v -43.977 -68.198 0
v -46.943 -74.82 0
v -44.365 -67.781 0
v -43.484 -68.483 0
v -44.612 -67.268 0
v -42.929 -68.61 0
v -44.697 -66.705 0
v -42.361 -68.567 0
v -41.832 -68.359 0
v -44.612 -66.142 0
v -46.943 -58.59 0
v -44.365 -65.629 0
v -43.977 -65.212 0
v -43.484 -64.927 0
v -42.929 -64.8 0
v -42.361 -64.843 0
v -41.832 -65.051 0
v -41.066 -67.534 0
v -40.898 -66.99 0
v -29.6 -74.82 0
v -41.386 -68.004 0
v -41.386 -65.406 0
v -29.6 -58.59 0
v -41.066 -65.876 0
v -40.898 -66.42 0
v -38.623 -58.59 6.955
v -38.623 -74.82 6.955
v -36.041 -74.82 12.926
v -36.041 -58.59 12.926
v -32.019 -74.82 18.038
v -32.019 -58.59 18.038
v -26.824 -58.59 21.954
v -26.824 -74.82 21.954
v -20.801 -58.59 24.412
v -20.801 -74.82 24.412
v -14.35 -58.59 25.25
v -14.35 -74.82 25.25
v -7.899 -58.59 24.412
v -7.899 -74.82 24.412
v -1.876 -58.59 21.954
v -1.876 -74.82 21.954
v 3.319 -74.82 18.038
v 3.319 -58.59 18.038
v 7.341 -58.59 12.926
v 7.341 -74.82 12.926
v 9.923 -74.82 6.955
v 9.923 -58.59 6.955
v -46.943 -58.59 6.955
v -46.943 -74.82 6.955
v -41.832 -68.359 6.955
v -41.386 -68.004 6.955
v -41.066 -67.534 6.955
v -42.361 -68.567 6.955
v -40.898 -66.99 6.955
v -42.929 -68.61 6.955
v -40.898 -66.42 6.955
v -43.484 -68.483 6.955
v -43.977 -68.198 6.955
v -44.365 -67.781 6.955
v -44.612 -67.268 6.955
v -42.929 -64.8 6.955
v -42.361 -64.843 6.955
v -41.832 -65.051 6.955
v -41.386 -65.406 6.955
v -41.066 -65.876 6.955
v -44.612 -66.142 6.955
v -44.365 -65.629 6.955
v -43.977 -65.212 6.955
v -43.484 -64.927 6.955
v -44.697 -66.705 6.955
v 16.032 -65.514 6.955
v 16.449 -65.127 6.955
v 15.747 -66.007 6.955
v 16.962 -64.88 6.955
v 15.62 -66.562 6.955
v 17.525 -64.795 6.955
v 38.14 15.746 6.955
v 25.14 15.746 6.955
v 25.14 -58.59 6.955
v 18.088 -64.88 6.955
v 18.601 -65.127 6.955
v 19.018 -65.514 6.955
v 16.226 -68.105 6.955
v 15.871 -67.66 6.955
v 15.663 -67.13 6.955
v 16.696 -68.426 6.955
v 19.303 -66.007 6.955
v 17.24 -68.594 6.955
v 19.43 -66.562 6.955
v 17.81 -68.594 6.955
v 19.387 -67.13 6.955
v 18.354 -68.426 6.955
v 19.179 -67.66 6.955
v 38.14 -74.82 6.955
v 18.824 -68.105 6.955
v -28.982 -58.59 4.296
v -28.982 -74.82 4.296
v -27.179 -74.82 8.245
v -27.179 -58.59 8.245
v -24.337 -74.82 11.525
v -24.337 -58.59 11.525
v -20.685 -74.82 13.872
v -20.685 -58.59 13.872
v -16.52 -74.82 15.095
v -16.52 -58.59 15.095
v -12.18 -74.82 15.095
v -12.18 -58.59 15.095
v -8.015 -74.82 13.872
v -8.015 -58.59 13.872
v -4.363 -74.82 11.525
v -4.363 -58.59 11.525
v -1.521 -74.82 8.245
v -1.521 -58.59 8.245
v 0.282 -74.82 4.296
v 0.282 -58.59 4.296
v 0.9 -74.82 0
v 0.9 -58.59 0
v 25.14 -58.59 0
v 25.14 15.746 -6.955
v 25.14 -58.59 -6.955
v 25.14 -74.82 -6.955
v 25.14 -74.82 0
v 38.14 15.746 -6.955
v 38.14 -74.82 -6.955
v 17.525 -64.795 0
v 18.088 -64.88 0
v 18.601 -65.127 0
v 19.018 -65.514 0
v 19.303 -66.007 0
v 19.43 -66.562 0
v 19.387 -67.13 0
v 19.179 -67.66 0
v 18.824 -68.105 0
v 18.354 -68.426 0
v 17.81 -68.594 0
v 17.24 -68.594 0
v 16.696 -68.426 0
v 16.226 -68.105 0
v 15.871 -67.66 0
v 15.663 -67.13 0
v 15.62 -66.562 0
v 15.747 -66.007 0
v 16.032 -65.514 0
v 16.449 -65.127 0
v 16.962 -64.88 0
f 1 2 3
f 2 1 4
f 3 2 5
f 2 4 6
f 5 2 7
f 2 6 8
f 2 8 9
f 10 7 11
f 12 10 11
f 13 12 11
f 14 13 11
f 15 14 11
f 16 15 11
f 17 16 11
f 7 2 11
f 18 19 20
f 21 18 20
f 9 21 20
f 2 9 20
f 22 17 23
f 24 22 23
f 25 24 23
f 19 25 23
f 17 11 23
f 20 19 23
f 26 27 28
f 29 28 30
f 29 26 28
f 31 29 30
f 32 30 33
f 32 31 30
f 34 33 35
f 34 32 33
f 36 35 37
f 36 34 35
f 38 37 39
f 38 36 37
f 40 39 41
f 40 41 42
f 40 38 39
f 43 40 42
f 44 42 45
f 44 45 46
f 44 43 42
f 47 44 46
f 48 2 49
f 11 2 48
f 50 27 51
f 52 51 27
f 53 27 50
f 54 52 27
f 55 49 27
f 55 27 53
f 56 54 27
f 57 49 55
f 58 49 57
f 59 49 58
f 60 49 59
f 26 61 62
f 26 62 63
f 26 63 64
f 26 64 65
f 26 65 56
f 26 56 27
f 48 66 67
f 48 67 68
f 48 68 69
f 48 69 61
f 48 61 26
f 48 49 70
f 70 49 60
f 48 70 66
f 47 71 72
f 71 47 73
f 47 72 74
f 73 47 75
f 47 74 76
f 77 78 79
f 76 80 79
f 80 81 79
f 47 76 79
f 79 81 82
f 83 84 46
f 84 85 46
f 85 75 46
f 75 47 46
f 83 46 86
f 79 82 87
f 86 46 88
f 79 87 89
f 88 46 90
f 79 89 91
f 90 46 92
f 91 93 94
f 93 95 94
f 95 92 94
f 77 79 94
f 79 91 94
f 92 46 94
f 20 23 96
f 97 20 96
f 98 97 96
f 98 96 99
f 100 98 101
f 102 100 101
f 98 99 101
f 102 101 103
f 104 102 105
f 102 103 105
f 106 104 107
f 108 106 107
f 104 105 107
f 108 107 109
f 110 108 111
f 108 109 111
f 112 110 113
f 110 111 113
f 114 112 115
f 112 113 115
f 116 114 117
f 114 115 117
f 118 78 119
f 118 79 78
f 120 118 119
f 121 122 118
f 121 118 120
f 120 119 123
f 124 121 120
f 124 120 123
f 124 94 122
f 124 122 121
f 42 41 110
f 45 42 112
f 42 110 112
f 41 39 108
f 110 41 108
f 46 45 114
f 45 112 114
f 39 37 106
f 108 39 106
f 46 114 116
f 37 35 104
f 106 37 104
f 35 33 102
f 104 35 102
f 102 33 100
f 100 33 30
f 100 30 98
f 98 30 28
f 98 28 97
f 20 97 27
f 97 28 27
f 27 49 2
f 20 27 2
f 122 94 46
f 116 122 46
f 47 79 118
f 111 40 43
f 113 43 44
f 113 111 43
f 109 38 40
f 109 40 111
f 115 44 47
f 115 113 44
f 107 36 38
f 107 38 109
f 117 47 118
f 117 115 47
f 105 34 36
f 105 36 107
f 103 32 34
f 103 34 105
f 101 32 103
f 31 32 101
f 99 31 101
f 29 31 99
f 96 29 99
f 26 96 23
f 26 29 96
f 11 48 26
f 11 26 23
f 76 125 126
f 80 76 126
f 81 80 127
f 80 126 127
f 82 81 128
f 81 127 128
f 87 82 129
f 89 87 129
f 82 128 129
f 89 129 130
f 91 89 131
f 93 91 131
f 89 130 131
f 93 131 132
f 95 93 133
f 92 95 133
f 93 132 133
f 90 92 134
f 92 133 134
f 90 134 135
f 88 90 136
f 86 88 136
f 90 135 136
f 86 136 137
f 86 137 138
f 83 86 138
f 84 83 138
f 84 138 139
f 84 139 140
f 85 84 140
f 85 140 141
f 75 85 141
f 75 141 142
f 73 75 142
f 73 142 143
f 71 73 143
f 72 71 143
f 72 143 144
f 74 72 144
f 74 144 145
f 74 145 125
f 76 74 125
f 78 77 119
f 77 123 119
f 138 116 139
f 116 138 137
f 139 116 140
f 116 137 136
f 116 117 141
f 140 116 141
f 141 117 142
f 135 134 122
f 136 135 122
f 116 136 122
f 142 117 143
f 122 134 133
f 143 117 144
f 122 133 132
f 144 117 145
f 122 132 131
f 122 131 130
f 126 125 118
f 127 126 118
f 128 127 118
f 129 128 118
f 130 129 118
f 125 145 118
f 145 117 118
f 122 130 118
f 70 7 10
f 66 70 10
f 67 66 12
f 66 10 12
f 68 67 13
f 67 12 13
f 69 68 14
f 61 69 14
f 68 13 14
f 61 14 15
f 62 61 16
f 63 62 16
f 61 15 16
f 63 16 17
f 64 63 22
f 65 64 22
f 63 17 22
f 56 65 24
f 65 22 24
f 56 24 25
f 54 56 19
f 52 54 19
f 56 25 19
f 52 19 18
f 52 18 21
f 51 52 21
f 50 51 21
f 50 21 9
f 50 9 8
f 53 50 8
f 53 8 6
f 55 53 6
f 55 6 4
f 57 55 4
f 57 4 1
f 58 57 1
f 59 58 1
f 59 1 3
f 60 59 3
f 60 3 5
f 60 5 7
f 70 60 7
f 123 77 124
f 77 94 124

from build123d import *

# Parameters (mm, degrees)
SKETCH_1_W                = 50.28
SKETCH_1_H                = 34.2
SKETCH_1_W_2              = 30.28
SKETCH_1_H_2              = 14.2
EXTRUDE_1_DEPTH           = 12.25
SKETCH_4_W                = 13
SKETCH_4_H                = 13.91
EXTRUDE_1_2_DEPTH         = 74.82
SKETCH_5_W                = 13.91
SKETCH_5_H                = 16.23
EXTRUDE_2_DEPTH           = 16
SKETCH_7_R                = 25.25
SKETCH_7_R_2              = 15.25
EXTRUDE_2_2_DEPTH         = 16.23
SKETCH_15_R               = 1.91
CUT_EXTRUDE_6_DEPTH       = 97.964478439
SKETCH_18_W               = 49.344544624
SKETCH_18_H               = 6.125
CUT_EXTRUDE_8_DEPTH       = 101.789238284
SKETCH_19_W               = 34.2
SKETCH_19_H               = 6.125
CUT_EXTRUDE_9_DEPTH       = 10
SKETCH_21_R               = 1.91
CUT_EXTRUDE_10_DEPTH      = 10
SKETCH_20_R               = 1.91
CUT_EXTRUDE_11_DEPTH      = 10
FILLET_START              = -7.1
FILLET_1_DEPTH            = 14.2
FILLET_2_DEPTH            = 14.2
SKETCH_29_W               = 13.91
SKETCH_29_H               = 74.82
EXTRUDE_5_DEPTH           = 10
SKETCH_30_W               = 10
SKETCH_30_H               = 58.59
CUT_EXTRUDE_13_DEPTH      = 97.964478439
SKETCH_32_W               = 34.2
SKETCH_32_H               = 5.745736365
EXTRUDE_6_DEPTH           = 10
CUT_EXTRUDE_16_DEPTH      = 50
CUT_EXTRUDE_16_DEPTH_BACK = 50
SKETCH_38_W               = 116.985630298
SKETCH_38_H               = 80.538350638
SKETCH_41_W               = 13.91
SKETCH_41_H               = 5.745736365
EXTRUDE_7_DEPTH           = 3
SKETCH_42_W               = 13
SKETCH_42_H               = 13.91
EXTRUDE_8_DEPTH           = 74.82
SKETCH_43_W               = 13.91
SKETCH_43_H               = 16.23
EXTRUDE_9_DEPTH           = 15.22
SKETCH_44_R               = 1.91
CUT_EXTRUDE_17_DEPTH      = 15.22
SKETCH_46_R               = 25.25
SKETCH_46_R_2             = 15.25
EXTRUDE_6_2_DEPTH         = 16.23
EXTRUDE_10_DEPTH          = 7.22
EXTRUDE_10_DEPTH_BACK     = 10
SKETCH_47_W               = 13.91
SKETCH_47_H               = 16.23
SKETCH_50_W               = 3.056753925
SKETCH_50_H               = 16.23
CUT_EXTRUDE_18_DEPTH      = 96.578211037
SKETCH_51_R               = 1.91
CUT_EXTRUDE_19_DEPTH      = 95.015226304
SKETCH_52_W               = 92.841945613
SKETCH_52_H               = 30
CUT_EXTRUDE_20_DEPTH      = 84.840694713
CUT_EXTRUDE_22_DEPTH      = 50
CUT_EXTRUDE_22_DEPTH_BACK = 50
SKETCH_53_W               = 63.541345486
SKETCH_53_H               = 14.170740414
SKETCH_54_W               = 10
SKETCH_54_H               = 10.145
CUT_EXTRUDE_23_DEPTH      = 50
SKETCH_55_W               = 13
SKETCH_55_H               = 13.91
EXTRUDE_11_DEPTH          = 10
SKETCH_57_W               = 15
SKETCH_57_H               = 34.2
EXTRUDE_12_DEPTH          = 10
SKETCH_58_W               = 34.2
SKETCH_58_H               = 10
EXTRUDE_13_DEPTH          = 27.85
SKETCH_60_W               = 34.2
SKETCH_60_H               = 10
EXTRUDE_14_DEPTH          = 50.28
SKETCH_62_W               = 30.28
SKETCH_62_H               = 14.2
CUT_EXTRUDE_24_DEPTH      = 50.28
SKETCH_64_R               = 1.91
CUT_EXTRUDE_25_DEPTH      = 10
FILLET_3_R                = 30
SKETCH_71_W               = 129.242048602
SKETCH_71_H               = 16.62743132
CUT_EXTRUDE_26_DEPTH      = 88


with BuildPart() as part:
    # 草圖1 → Extrude 1 (new body)
    with BuildSketch(Plane(origin=(0, 0, 0), x_dir=(1, 0, 0), z_dir=(0, 1, 0))):
        Rectangle(SKETCH_1_W, SKETCH_1_H)
        Rectangle(SKETCH_1_W_2, SKETCH_1_H_2, mode=Mode.SUBTRACT)
    extrude(amount=EXTRUDE_1_DEPTH)

    # 草圖4 → Extrude 1 2 (add)
    with BuildSketch(Plane.XZ):
        with Locations((18.64, 0)):
            Rectangle(SKETCH_4_W, SKETCH_4_H)
    extrude(amount=EXTRUDE_1_2_DEPTH)

    # 草圖5 → Extrude 2 (add)
    with BuildSketch(Plane.ZY.offset(-12.14)):
        with Locations((0, -66.705)):
            Rectangle(SKETCH_5_W, SKETCH_5_H)
    extrude(amount=EXTRUDE_2_DEPTH)

    # 草圖7 → Extrude 2 2 (add)
    with BuildSketch(Plane(origin=(3.626674765, -74.82, 0), x_dir=(1, 0, 0), z_dir=(0, -1, 0))):
        with Locations((-30.978154344, 0)):
            Circle(SKETCH_7_R)
        with Locations((-30.978154344, 0)):
            Circle(SKETCH_7_R_2, mode=Mode.SUBTRACT)
    extrude(amount=-EXTRUDE_2_2_DEPTH)

    # 草圖15 → 除料-伸長6 (cut, through all)
    with BuildSketch(Plane(origin=(0, 0, -6.955), x_dir=(-1, 0, 0), z_dir=(0, 0, -1))):
        with Locations((-4.530883248, -66.705)):
            Circle(SKETCH_15_R)
    extrude(amount=-CUT_EXTRUDE_6_DEPTH, mode=Mode.SUBTRACT)

    # 草圖18 → 除料-伸長8 (cut, through all)
    with BuildSketch(Plane(origin=(0, 0, -17.1), x_dir=(-1, 0, 0), z_dir=(0, 0, -1))):
        with Locations((0.467727688, 9.1875)):
            Rectangle(SKETCH_18_W, SKETCH_18_H)
    extrude(amount=-CUT_EXTRUDE_8_DEPTH, mode=Mode.SUBTRACT)

    # 草圖19 → 除料-伸長9 (cut)
    with BuildSketch(Plane.ZY.offset(-24.204544624)):
        with Locations((0, 9.1875)):
            Rectangle(SKETCH_19_W, SKETCH_19_H)
    extrude(amount=-CUT_EXTRUDE_9_DEPTH, mode=Mode.SUBTRACT)

    # 草圖21 → 除料-伸長10 (cut)
    with BuildSketch(Plane(origin=(0, 6.125, 0), x_dir=(1, 0, 0), z_dir=(0, 1, 0))):
        with Locations(Location((17.69, 0, 0), (0, 0, 270))):
            Circle(SKETCH_21_R)
    extrude(amount=-CUT_EXTRUDE_10_DEPTH, mode=Mode.SUBTRACT)

    # 草圖20 → 除料-伸長11 (cut)
    with BuildSketch(Plane(origin=(0, 6.125, 0), x_dir=(1, 0, 0), z_dir=(0, 1, 0))):
        with Locations(Location((-17.395, 0, 0), (0, 0, 270))):
            Circle(SKETCH_20_R)
    extrude(amount=-CUT_EXTRUDE_11_DEPTH, mode=Mode.SUBTRACT)

    # 圓角1: read off the stored shape, not the designer's step
    # 圓角1 outline → 圓角1 (cut)
    with BuildSketch(Plane.XY.offset(FILLET_START)):
        with BuildLine():
            add(Edge.make_bspline(
                [(-15.14, 0), (-21.974170252, 5.199829476), (-25.14, 5.745736365)],
                knots=[0, 0, 0, 0.664102345, 0.664102345, 0.664102345], degree=2, weights=[1, 2.223777218, 1.822127795]))
            Line((-15.14, 0), (-15.14, 6.125))
            Line((-15.14, 6.125), (-25.14, 6.125))
            Line((-25.14, 6.125), (-25.14, 5.745736365))
        make_face()
    extrude(amount=FILLET_1_DEPTH, mode=Mode.SUBTRACT)

    # 圓角2: read off the stored shape, not the designer's step
    # 圓角2 outline → 圓角2 (cut)
    with BuildSketch(Plane.XY.offset(FILLET_START)):
        with BuildLine():
            Line((15.14, 6.125), (15.14, 0))
            add(Edge.make_bspline(
                [(15.14, 0), (21.974170252, 5.199829476), (25.14, 5.745736365)],
                knots=[0, 0, 0, 0.664102345, 0.664102345, 0.664102345], degree=2, weights=[1, 2.223777218, 1.822127795]))
            Line((25.14, 5.745736365), (25.14, 6.125))
            Line((25.14, 6.125), (15.14, 6.125))
        make_face()
    extrude(amount=FILLET_2_DEPTH, mode=Mode.SUBTRACT)

    # 草圖29 → 填料-伸長5 (add)
    with BuildSketch(Plane(origin=(25.14, 0, 0), x_dir=(0, 0, -1), z_dir=(1, 0, 0))):
        with Locations((0, -37.41)):
            Rectangle(SKETCH_29_W, SKETCH_29_H)
    extrude(amount=EXTRUDE_5_DEPTH)

    # 草圖30 → 除料-伸長13 (cut, through all)
    with BuildSketch(Plane.XY.offset(6.955)):
        with Locations((17.14, -29.295)):
            Rectangle(SKETCH_30_W, SKETCH_30_H)
    extrude(amount=-CUT_EXTRUDE_13_DEPTH, mode=Mode.SUBTRACT)

    # 草圖32 → Extrude 6 (add)
    with BuildSketch(Plane(origin=(25.14, 0, 0), x_dir=(0, 0, -1), z_dir=(1, 0, 0))):
        with Locations((0, 2.872868182)):
            Rectangle(SKETCH_32_W, SKETCH_32_H)
    extrude(amount=EXTRUDE_6_DEPTH)

    # 草圖38 → 除料-伸長16 (cut, two sides: drawn at the far end of the back side and taken through both)
    with BuildSketch(Plane(origin=(0, 0, -6.955), x_dir=(-1, 0, 0), z_dir=(0, 0, -1)).offset(-CUT_EXTRUDE_16_DEPTH_BACK)):
        with Locations((7.268869252, -40.269175319)):
            Rectangle(SKETCH_38_W, SKETCH_38_H)
    extrude(amount=CUT_EXTRUDE_16_DEPTH + CUT_EXTRUDE_16_DEPTH_BACK, mode=Mode.SUBTRACT)

    # 草圖41 → 填料-伸長7 (add)
    with BuildSketch(Plane(origin=(35.14, 0, 0), x_dir=(0, 0, -1), z_dir=(1, 0, 0))):
        with Locations((0, 2.872868182)):
            Rectangle(SKETCH_41_W, SKETCH_41_H)
    extrude(amount=EXTRUDE_7_DEPTH)

    # 草圖42 → 填料-伸長8 (add)
    with BuildSketch(Plane(origin=(0, 0, 0), x_dir=(-1, 0, 0), z_dir=(0, -1, 0))):
        with Locations((-31.64, 0)):
            Rectangle(SKETCH_42_W, SKETCH_42_H)
    extrude(amount=EXTRUDE_8_DEPTH)

    # 草圖43 → 填料-伸長9 (add)
    with BuildSketch(Plane.ZY.offset(-25.14)):
        with Locations((0, -66.705)):
            Rectangle(SKETCH_43_W, SKETCH_43_H)
    extrude(amount=EXTRUDE_9_DEPTH)

    # 草圖44 → 除料-伸長17 (cut)
    with BuildSketch(Plane(origin=(0, 0, -6.955), x_dir=(-1, 0, 0), z_dir=(0, 0, -1))):
        with Locations(Location((-17.524895264, -66.705, 0), (0, 0, 90))):
            Circle(SKETCH_44_R)
    extrude(amount=-CUT_EXTRUDE_17_DEPTH, mode=Mode.SUBTRACT)

    # 草圖46 → Extrude 6 2 (add)
    with BuildSketch(Plane(origin=(0, -58.59, 0), x_dir=(1, 0, 0), z_dir=(0, 1, 0))):
        with Locations((-14.35, 0)):
            Circle(SKETCH_46_R)
        with Locations((-14.35, 0)):
            Circle(SKETCH_46_R_2, mode=Mode.SUBTRACT)
    extrude(amount=-EXTRUDE_6_2_DEPTH)

    # 草圖47 → 填料-伸長10 (add, two sides: drawn at the far end of the back side and taken through both)
    with BuildSketch(Plane(origin=(-40, 0, 0), x_dir=(0, 0, -1), z_dir=(1, 0, 0)).offset(-EXTRUDE_10_DEPTH_BACK)):
        with Locations((0, -66.705)):
            Rectangle(SKETCH_47_W, SKETCH_47_H)
    extrude(amount=EXTRUDE_10_DEPTH + EXTRUDE_10_DEPTH_BACK)

    # 草圖50 → 除料-伸長18 (cut, through all)
    with BuildSketch(Plane(origin=(0, 0, -6.955), x_dir=(-1, 0, 0), z_dir=(0, 0, -1))):
        with Locations((48.471623038, -66.705)):
            Rectangle(SKETCH_50_W, SKETCH_50_H)
    extrude(amount=-CUT_EXTRUDE_18_DEPTH, mode=Mode.SUBTRACT)

    # 草圖51 → 除料-伸長19 (cut, through all)
    with BuildSketch(Plane(origin=(0, 0, -6.955), x_dir=(-1, 0, 0), z_dir=(0, 0, -1))):
        with Locations((42.786508152, -66.705)):
            Circle(SKETCH_51_R)
    extrude(amount=-CUT_EXTRUDE_19_DEPTH, mode=Mode.SUBTRACT)

    # 草圖52 → 除料-伸長20 (cut, through all)
    with BuildSketch(Plane(origin=(0, -58.59, 0), x_dir=(1, 0, 0), z_dir=(0, 1, 0))):
        with Locations((-21.280972807, 15)):
            Rectangle(SKETCH_52_W, SKETCH_52_H)
    extrude(amount=-CUT_EXTRUDE_20_DEPTH, mode=Mode.SUBTRACT)

    # 草圖53 → 除料-伸長22 (cut, two sides: drawn at the far end of the back side and taken through both)
    with BuildSketch(Plane(origin=(0, 0, -6.955), x_dir=(-1, 0, 0), z_dir=(0, 0, -1)).offset(-CUT_EXTRUDE_22_DEPTH_BACK)):
        with Locations((6.630672743, -0.960370207)):
            Rectangle(SKETCH_53_W, SKETCH_53_H)
    extrude(amount=CUT_EXTRUDE_22_DEPTH + CUT_EXTRUDE_22_DEPTH_BACK, mode=Mode.SUBTRACT)

    # 草圖54 → 除料-伸長23 (cut)
    with BuildSketch(Plane(origin=(0, 5.745736365, 0), x_dir=(1, 0, 0), z_dir=(0, 1, 0))):
        with Locations((30.14, -12.0275)):
            Rectangle(SKETCH_54_W, SKETCH_54_H)
        with Locations((30.14, 12.0275)):
            Rectangle(SKETCH_54_W, SKETCH_54_H)
    extrude(amount=-CUT_EXTRUDE_23_DEPTH, mode=Mode.SUBTRACT)

    # 草圖55 → 填料-伸長11 (add)
    with BuildSketch(Plane(origin=(0, 5.745736365, 0), x_dir=(1, 0, 0), z_dir=(0, 1, 0))):
        with Locations((31.64, 0)):
            Rectangle(SKETCH_55_W, SKETCH_55_H)
    extrude(amount=EXTRUDE_11_DEPTH)

    # 草圖57 → 填料-伸長12 (add)
    with BuildSketch(Plane(origin=(0, 15.745736365, 0), x_dir=(1, 0, 0), z_dir=(0, 1, 0))):
        with Locations((31.64, 0)):
            Rectangle(SKETCH_57_W, SKETCH_57_H)
    extrude(amount=EXTRUDE_12_DEPTH)

    # 草圖58 → 填料-伸長13 (add)
    with BuildSketch(Plane.ZY.offset(-24.14)):
        with Locations((0, 20.745736365)):
            Rectangle(SKETCH_58_W, SKETCH_58_H)
    extrude(amount=EXTRUDE_13_DEPTH)

    # 草圖60 → 填料-伸長14 (add)
    with BuildSketch(Plane.ZY.offset(3.71)):
        with Locations((0, 20.745736365)):
            Rectangle(SKETCH_60_W, SKETCH_60_H)
    extrude(amount=EXTRUDE_14_DEPTH)

    # 草圖62 → 除料-伸長24 (cut)
    with BuildSketch(Plane(origin=(0, 25.745736365, 0), x_dir=(1, 0, 0), z_dir=(0, 1, 0))):
        with Locations((-28.85, 0)):
            Rectangle(SKETCH_62_W, SKETCH_62_H)
    extrude(amount=-CUT_EXTRUDE_24_DEPTH, mode=Mode.SUBTRACT)

    # 草圖64 → 除料-伸長25 (cut)
    with BuildSketch(Plane(origin=(0, 25.745736365, 0), x_dir=(1, 0, 0), z_dir=(0, 1, 0))):
        with Locations(Location((-8.71, 0, 0), (0, 0, 270))):
            Circle(SKETCH_64_R)
        with Locations(Location((-48.99, 0, 0), (0, 0, 270))):
            Circle(SKETCH_64_R)
    extrude(amount=-CUT_EXTRUDE_25_DEPTH, mode=Mode.SUBTRACT)

    # 圓角3
    # the kernel refuses this fillet: 30 mm, written as the material it takes off along each edge
    with BuildSketch(Plane(origin=(-43.99, 25.745736365, 7.1), x_dir=(-1, 0, 0), z_dir=(0, 0, -1)), Plane(origin=(-13.71, 25.745736365, -7.1), x_dir=(1, 0, 0), z_dir=(0, 0, 1))) as fillet_3_piece_1:
        with BuildLine():
            CenterArc((22.360679775, -30), FILLET_3_R, 90, 48.189685104)
            Line((0, -10), (0, 0))
            Line((0, 0), (22.360679775, 0))
        make_face()
    extrude(amount=14.2, mode=Mode.SUBTRACT)

    # 草圖71 → 除料-伸長26 (cut)
    with BuildSketch(Plane(origin=(0, 0, -17.1), x_dir=(-1, 0, 0), z_dir=(0, 0, -1))):
        with Locations((25.481024301, 24.059452025)):
            Rectangle(SKETCH_71_W, SKETCH_71_H)
    extrude(amount=-CUT_EXTRUDE_26_DEPTH, mode=Mode.SUBTRACT)


solid = part.part
